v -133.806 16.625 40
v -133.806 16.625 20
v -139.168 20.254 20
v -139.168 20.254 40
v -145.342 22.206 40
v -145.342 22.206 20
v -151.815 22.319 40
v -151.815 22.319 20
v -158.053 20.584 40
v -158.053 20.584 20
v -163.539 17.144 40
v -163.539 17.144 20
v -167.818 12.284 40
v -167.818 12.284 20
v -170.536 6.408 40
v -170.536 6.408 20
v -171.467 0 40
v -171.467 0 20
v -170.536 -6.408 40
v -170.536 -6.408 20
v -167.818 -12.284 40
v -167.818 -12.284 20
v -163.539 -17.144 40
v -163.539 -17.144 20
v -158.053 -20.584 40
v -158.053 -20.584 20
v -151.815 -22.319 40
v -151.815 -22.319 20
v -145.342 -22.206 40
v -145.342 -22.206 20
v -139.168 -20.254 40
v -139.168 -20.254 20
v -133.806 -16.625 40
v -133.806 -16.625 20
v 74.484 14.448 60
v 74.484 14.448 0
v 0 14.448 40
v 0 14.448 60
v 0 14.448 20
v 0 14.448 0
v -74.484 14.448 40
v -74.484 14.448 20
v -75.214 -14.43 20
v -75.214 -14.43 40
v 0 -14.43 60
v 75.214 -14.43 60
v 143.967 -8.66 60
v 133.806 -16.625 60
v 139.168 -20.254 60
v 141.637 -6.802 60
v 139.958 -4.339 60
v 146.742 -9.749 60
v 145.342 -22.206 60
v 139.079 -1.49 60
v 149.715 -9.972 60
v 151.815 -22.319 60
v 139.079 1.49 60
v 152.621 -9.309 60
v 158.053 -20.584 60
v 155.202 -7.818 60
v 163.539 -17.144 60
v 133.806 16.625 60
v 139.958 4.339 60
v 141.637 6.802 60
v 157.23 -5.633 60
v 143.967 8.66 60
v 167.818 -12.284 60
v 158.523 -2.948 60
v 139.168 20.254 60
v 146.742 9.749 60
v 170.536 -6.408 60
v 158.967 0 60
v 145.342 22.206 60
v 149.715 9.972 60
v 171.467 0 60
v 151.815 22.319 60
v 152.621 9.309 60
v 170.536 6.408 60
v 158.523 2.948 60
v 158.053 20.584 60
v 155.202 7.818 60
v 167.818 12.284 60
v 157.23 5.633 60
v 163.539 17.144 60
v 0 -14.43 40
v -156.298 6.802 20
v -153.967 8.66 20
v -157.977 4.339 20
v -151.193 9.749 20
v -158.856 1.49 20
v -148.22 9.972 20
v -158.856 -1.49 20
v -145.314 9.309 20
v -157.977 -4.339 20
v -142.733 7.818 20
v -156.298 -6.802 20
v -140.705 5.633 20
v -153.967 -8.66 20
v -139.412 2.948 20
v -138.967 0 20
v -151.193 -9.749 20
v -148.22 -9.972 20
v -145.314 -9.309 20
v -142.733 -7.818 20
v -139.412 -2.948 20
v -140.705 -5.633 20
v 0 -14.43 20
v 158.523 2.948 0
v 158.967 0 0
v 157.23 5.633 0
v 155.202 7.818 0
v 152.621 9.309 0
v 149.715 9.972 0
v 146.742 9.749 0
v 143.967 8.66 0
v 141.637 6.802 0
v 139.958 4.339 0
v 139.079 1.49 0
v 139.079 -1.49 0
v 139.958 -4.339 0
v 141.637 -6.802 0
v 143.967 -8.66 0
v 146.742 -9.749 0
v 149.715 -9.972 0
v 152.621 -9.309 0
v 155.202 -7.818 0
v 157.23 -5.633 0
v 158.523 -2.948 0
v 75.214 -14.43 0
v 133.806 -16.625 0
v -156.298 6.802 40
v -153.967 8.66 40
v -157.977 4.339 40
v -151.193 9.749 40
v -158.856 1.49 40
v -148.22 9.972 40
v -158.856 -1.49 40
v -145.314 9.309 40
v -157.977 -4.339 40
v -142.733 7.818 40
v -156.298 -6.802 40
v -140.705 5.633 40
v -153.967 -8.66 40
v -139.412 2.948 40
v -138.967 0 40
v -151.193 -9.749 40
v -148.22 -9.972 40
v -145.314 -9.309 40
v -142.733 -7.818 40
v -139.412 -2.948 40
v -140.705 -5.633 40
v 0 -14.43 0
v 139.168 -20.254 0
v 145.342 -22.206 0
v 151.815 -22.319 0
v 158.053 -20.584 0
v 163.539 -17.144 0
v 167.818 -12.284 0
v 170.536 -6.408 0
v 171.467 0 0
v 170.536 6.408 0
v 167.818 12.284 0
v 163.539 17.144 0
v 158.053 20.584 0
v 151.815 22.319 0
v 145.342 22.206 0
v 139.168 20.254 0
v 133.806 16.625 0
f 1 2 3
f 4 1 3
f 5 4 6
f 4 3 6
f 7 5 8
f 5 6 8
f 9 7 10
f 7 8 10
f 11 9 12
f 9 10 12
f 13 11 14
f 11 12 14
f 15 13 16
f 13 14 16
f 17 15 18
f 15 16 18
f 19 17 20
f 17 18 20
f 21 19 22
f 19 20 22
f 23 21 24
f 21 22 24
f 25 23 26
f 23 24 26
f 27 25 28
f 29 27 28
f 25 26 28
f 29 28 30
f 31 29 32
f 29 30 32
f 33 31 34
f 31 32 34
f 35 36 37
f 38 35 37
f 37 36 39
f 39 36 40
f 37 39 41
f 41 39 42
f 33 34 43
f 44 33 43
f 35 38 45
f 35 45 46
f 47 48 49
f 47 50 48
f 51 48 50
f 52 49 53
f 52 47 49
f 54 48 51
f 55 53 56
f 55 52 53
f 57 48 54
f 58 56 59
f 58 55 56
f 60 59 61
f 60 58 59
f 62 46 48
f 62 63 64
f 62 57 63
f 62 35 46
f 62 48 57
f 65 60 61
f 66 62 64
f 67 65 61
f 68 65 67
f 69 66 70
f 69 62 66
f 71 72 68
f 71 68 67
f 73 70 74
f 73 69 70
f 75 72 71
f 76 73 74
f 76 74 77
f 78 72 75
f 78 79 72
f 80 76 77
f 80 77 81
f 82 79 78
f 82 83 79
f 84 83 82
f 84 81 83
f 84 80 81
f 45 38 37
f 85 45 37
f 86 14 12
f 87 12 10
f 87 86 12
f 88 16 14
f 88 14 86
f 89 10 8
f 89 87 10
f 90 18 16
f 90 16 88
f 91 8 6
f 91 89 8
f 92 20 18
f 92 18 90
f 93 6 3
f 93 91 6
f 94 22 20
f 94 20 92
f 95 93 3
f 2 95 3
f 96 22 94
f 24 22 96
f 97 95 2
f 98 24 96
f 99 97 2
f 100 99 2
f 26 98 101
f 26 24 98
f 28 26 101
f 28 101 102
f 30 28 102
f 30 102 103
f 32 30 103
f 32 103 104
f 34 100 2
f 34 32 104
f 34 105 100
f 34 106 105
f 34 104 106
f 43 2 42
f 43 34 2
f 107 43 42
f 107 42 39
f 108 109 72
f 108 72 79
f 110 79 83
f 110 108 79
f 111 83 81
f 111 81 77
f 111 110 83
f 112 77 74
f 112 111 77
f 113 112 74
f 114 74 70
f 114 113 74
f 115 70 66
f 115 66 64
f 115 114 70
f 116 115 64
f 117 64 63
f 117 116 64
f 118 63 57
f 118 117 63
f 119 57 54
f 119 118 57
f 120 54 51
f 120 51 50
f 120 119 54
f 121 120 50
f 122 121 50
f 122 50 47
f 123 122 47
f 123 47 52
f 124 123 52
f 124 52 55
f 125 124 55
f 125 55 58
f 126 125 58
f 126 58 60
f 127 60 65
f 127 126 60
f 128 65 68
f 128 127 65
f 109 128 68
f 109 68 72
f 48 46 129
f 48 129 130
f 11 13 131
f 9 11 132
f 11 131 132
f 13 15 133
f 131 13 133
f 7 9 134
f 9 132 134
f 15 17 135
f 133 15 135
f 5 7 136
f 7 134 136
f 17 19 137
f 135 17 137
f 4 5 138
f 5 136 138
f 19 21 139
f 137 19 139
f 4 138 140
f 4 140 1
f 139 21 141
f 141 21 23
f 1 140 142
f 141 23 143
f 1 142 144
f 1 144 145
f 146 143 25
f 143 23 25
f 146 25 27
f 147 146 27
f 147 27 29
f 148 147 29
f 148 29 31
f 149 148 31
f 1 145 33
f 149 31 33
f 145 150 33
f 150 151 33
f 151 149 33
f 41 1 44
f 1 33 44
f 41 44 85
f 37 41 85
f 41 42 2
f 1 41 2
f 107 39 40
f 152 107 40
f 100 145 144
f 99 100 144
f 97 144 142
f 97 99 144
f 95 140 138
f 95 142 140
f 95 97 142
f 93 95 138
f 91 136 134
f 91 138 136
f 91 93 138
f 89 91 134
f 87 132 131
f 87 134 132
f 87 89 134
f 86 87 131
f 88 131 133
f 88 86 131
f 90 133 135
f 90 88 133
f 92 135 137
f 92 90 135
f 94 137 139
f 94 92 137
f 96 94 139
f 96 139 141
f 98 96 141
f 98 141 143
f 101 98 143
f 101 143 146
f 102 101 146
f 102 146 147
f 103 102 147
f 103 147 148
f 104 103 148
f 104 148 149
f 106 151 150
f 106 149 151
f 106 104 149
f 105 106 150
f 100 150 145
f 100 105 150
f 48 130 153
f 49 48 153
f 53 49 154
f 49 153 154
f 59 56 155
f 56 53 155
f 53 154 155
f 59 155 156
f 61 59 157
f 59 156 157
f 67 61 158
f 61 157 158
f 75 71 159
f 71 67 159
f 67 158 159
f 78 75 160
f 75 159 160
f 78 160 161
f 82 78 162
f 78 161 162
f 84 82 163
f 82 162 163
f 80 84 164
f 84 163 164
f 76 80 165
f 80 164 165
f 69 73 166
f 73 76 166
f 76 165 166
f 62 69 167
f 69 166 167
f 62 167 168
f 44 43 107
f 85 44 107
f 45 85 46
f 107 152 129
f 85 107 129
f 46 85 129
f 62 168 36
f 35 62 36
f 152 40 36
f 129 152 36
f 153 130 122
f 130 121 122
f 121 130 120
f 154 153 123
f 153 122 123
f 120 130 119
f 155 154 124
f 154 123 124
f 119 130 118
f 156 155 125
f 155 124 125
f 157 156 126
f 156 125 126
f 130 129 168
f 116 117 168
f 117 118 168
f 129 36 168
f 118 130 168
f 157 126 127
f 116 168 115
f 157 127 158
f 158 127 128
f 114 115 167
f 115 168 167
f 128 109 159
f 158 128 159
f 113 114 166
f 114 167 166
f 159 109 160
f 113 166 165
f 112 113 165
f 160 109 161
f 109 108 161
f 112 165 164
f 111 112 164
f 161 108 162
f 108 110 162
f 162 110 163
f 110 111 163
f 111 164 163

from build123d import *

# Parameters (mm, degrees)
SKETCH1_R              = 22.5
SKETCH1_R_2            = 10
BOSS_EXTRUDE1_DEPTH    = 60
CUT_EXTRUDE1_START     = -36.947990214
CUT_EXTRUDE1_OUTLINE_W = 173
CUT_EXTRUDE1_OUTLINE_H = 20
CUT_EXTRUDE1_DEPTH     = 45


# Read off the part's stored shape, not the designer's step: Cut-Extrude1
with BuildPart() as part:
    # Sketch1 → Boss-Extrude1 (new body)
    # profile 1 of 3: a face of its own
    with BuildSketch(Plane.XY):
        with Locations((-148.967401035, 0)):
            Circle(SKETCH1_R)
        with Locations((-148.967401035, 0)):
            Circle(SKETCH1_R_2, mode=Mode.SUBTRACT)
    # profile 2 of 3: a face of its own
    with BuildSketch(Plane.XY):
        with BuildLine():
            Line((-133.805803377, -16.624558835), (-75.213723302, -14.429535265))
            Line((-75.213723302, -14.429535265), (0, -14.429535265))
            Line((0, -14.429535265), (75.213723302, -14.429535265))
            Line((75.213723302, -14.429535265), (133.805803377, -16.624558835))
            ThreePointArc((133.805803377, -16.624558835), (126.467401035, 0), (133.805803377, 16.624558835))
            Line((133.805803377, 16.624558835), (74.483700517, 14.447990214))
            Line((74.483700517, 14.447990214), (0, 14.447990214))
            Line((0, 14.447990214), (-74.483700517, 14.447990214))
            Line((-74.483700517, 14.447990214), (-133.805803377, 16.624558835))
            ThreePointArc((-133.805803377, 16.624558835), (-128.383597362, 9.086089717), (-126.467401035, 0))
            ThreePointArc((-126.467401035, 0), (-128.383597362, -9.086089717), (-133.805803377, -16.624558835))
        make_face()
    # profile 3 of 3: a face of its own
    with BuildSketch(Plane.XY):
        with Locations((148.967401035, 0)):
            Circle(SKETCH1_R)
        with Locations((148.967401035, 0)):
            Circle(SKETCH1_R_2, mode=Mode.SUBTRACT)
    extrude(amount=BOSS_EXTRUDE1_DEPTH)

    # Cut-Extrude1 outline → Cut-Extrude1 (cut)
    with BuildSketch(Plane(origin=(0, 14.447990214, 0), x_dir=(1, 0, 0), z_dir=(0, 1, 0)).offset(CUT_EXTRUDE1_START)):
        with Locations((-86.5, -10)):
            Rectangle(CUT_EXTRUDE1_OUTLINE_W, CUT_EXTRUDE1_OUTLINE_H)
        with Locations((-86.5, -50)):
            Rectangle(CUT_EXTRUDE1_OUTLINE_W, CUT_EXTRUDE1_OUTLINE_H)
    extrude(amount=CUT_EXTRUDE1_DEPTH, mode=Mode.SUBTRACT)


solid = part.part
